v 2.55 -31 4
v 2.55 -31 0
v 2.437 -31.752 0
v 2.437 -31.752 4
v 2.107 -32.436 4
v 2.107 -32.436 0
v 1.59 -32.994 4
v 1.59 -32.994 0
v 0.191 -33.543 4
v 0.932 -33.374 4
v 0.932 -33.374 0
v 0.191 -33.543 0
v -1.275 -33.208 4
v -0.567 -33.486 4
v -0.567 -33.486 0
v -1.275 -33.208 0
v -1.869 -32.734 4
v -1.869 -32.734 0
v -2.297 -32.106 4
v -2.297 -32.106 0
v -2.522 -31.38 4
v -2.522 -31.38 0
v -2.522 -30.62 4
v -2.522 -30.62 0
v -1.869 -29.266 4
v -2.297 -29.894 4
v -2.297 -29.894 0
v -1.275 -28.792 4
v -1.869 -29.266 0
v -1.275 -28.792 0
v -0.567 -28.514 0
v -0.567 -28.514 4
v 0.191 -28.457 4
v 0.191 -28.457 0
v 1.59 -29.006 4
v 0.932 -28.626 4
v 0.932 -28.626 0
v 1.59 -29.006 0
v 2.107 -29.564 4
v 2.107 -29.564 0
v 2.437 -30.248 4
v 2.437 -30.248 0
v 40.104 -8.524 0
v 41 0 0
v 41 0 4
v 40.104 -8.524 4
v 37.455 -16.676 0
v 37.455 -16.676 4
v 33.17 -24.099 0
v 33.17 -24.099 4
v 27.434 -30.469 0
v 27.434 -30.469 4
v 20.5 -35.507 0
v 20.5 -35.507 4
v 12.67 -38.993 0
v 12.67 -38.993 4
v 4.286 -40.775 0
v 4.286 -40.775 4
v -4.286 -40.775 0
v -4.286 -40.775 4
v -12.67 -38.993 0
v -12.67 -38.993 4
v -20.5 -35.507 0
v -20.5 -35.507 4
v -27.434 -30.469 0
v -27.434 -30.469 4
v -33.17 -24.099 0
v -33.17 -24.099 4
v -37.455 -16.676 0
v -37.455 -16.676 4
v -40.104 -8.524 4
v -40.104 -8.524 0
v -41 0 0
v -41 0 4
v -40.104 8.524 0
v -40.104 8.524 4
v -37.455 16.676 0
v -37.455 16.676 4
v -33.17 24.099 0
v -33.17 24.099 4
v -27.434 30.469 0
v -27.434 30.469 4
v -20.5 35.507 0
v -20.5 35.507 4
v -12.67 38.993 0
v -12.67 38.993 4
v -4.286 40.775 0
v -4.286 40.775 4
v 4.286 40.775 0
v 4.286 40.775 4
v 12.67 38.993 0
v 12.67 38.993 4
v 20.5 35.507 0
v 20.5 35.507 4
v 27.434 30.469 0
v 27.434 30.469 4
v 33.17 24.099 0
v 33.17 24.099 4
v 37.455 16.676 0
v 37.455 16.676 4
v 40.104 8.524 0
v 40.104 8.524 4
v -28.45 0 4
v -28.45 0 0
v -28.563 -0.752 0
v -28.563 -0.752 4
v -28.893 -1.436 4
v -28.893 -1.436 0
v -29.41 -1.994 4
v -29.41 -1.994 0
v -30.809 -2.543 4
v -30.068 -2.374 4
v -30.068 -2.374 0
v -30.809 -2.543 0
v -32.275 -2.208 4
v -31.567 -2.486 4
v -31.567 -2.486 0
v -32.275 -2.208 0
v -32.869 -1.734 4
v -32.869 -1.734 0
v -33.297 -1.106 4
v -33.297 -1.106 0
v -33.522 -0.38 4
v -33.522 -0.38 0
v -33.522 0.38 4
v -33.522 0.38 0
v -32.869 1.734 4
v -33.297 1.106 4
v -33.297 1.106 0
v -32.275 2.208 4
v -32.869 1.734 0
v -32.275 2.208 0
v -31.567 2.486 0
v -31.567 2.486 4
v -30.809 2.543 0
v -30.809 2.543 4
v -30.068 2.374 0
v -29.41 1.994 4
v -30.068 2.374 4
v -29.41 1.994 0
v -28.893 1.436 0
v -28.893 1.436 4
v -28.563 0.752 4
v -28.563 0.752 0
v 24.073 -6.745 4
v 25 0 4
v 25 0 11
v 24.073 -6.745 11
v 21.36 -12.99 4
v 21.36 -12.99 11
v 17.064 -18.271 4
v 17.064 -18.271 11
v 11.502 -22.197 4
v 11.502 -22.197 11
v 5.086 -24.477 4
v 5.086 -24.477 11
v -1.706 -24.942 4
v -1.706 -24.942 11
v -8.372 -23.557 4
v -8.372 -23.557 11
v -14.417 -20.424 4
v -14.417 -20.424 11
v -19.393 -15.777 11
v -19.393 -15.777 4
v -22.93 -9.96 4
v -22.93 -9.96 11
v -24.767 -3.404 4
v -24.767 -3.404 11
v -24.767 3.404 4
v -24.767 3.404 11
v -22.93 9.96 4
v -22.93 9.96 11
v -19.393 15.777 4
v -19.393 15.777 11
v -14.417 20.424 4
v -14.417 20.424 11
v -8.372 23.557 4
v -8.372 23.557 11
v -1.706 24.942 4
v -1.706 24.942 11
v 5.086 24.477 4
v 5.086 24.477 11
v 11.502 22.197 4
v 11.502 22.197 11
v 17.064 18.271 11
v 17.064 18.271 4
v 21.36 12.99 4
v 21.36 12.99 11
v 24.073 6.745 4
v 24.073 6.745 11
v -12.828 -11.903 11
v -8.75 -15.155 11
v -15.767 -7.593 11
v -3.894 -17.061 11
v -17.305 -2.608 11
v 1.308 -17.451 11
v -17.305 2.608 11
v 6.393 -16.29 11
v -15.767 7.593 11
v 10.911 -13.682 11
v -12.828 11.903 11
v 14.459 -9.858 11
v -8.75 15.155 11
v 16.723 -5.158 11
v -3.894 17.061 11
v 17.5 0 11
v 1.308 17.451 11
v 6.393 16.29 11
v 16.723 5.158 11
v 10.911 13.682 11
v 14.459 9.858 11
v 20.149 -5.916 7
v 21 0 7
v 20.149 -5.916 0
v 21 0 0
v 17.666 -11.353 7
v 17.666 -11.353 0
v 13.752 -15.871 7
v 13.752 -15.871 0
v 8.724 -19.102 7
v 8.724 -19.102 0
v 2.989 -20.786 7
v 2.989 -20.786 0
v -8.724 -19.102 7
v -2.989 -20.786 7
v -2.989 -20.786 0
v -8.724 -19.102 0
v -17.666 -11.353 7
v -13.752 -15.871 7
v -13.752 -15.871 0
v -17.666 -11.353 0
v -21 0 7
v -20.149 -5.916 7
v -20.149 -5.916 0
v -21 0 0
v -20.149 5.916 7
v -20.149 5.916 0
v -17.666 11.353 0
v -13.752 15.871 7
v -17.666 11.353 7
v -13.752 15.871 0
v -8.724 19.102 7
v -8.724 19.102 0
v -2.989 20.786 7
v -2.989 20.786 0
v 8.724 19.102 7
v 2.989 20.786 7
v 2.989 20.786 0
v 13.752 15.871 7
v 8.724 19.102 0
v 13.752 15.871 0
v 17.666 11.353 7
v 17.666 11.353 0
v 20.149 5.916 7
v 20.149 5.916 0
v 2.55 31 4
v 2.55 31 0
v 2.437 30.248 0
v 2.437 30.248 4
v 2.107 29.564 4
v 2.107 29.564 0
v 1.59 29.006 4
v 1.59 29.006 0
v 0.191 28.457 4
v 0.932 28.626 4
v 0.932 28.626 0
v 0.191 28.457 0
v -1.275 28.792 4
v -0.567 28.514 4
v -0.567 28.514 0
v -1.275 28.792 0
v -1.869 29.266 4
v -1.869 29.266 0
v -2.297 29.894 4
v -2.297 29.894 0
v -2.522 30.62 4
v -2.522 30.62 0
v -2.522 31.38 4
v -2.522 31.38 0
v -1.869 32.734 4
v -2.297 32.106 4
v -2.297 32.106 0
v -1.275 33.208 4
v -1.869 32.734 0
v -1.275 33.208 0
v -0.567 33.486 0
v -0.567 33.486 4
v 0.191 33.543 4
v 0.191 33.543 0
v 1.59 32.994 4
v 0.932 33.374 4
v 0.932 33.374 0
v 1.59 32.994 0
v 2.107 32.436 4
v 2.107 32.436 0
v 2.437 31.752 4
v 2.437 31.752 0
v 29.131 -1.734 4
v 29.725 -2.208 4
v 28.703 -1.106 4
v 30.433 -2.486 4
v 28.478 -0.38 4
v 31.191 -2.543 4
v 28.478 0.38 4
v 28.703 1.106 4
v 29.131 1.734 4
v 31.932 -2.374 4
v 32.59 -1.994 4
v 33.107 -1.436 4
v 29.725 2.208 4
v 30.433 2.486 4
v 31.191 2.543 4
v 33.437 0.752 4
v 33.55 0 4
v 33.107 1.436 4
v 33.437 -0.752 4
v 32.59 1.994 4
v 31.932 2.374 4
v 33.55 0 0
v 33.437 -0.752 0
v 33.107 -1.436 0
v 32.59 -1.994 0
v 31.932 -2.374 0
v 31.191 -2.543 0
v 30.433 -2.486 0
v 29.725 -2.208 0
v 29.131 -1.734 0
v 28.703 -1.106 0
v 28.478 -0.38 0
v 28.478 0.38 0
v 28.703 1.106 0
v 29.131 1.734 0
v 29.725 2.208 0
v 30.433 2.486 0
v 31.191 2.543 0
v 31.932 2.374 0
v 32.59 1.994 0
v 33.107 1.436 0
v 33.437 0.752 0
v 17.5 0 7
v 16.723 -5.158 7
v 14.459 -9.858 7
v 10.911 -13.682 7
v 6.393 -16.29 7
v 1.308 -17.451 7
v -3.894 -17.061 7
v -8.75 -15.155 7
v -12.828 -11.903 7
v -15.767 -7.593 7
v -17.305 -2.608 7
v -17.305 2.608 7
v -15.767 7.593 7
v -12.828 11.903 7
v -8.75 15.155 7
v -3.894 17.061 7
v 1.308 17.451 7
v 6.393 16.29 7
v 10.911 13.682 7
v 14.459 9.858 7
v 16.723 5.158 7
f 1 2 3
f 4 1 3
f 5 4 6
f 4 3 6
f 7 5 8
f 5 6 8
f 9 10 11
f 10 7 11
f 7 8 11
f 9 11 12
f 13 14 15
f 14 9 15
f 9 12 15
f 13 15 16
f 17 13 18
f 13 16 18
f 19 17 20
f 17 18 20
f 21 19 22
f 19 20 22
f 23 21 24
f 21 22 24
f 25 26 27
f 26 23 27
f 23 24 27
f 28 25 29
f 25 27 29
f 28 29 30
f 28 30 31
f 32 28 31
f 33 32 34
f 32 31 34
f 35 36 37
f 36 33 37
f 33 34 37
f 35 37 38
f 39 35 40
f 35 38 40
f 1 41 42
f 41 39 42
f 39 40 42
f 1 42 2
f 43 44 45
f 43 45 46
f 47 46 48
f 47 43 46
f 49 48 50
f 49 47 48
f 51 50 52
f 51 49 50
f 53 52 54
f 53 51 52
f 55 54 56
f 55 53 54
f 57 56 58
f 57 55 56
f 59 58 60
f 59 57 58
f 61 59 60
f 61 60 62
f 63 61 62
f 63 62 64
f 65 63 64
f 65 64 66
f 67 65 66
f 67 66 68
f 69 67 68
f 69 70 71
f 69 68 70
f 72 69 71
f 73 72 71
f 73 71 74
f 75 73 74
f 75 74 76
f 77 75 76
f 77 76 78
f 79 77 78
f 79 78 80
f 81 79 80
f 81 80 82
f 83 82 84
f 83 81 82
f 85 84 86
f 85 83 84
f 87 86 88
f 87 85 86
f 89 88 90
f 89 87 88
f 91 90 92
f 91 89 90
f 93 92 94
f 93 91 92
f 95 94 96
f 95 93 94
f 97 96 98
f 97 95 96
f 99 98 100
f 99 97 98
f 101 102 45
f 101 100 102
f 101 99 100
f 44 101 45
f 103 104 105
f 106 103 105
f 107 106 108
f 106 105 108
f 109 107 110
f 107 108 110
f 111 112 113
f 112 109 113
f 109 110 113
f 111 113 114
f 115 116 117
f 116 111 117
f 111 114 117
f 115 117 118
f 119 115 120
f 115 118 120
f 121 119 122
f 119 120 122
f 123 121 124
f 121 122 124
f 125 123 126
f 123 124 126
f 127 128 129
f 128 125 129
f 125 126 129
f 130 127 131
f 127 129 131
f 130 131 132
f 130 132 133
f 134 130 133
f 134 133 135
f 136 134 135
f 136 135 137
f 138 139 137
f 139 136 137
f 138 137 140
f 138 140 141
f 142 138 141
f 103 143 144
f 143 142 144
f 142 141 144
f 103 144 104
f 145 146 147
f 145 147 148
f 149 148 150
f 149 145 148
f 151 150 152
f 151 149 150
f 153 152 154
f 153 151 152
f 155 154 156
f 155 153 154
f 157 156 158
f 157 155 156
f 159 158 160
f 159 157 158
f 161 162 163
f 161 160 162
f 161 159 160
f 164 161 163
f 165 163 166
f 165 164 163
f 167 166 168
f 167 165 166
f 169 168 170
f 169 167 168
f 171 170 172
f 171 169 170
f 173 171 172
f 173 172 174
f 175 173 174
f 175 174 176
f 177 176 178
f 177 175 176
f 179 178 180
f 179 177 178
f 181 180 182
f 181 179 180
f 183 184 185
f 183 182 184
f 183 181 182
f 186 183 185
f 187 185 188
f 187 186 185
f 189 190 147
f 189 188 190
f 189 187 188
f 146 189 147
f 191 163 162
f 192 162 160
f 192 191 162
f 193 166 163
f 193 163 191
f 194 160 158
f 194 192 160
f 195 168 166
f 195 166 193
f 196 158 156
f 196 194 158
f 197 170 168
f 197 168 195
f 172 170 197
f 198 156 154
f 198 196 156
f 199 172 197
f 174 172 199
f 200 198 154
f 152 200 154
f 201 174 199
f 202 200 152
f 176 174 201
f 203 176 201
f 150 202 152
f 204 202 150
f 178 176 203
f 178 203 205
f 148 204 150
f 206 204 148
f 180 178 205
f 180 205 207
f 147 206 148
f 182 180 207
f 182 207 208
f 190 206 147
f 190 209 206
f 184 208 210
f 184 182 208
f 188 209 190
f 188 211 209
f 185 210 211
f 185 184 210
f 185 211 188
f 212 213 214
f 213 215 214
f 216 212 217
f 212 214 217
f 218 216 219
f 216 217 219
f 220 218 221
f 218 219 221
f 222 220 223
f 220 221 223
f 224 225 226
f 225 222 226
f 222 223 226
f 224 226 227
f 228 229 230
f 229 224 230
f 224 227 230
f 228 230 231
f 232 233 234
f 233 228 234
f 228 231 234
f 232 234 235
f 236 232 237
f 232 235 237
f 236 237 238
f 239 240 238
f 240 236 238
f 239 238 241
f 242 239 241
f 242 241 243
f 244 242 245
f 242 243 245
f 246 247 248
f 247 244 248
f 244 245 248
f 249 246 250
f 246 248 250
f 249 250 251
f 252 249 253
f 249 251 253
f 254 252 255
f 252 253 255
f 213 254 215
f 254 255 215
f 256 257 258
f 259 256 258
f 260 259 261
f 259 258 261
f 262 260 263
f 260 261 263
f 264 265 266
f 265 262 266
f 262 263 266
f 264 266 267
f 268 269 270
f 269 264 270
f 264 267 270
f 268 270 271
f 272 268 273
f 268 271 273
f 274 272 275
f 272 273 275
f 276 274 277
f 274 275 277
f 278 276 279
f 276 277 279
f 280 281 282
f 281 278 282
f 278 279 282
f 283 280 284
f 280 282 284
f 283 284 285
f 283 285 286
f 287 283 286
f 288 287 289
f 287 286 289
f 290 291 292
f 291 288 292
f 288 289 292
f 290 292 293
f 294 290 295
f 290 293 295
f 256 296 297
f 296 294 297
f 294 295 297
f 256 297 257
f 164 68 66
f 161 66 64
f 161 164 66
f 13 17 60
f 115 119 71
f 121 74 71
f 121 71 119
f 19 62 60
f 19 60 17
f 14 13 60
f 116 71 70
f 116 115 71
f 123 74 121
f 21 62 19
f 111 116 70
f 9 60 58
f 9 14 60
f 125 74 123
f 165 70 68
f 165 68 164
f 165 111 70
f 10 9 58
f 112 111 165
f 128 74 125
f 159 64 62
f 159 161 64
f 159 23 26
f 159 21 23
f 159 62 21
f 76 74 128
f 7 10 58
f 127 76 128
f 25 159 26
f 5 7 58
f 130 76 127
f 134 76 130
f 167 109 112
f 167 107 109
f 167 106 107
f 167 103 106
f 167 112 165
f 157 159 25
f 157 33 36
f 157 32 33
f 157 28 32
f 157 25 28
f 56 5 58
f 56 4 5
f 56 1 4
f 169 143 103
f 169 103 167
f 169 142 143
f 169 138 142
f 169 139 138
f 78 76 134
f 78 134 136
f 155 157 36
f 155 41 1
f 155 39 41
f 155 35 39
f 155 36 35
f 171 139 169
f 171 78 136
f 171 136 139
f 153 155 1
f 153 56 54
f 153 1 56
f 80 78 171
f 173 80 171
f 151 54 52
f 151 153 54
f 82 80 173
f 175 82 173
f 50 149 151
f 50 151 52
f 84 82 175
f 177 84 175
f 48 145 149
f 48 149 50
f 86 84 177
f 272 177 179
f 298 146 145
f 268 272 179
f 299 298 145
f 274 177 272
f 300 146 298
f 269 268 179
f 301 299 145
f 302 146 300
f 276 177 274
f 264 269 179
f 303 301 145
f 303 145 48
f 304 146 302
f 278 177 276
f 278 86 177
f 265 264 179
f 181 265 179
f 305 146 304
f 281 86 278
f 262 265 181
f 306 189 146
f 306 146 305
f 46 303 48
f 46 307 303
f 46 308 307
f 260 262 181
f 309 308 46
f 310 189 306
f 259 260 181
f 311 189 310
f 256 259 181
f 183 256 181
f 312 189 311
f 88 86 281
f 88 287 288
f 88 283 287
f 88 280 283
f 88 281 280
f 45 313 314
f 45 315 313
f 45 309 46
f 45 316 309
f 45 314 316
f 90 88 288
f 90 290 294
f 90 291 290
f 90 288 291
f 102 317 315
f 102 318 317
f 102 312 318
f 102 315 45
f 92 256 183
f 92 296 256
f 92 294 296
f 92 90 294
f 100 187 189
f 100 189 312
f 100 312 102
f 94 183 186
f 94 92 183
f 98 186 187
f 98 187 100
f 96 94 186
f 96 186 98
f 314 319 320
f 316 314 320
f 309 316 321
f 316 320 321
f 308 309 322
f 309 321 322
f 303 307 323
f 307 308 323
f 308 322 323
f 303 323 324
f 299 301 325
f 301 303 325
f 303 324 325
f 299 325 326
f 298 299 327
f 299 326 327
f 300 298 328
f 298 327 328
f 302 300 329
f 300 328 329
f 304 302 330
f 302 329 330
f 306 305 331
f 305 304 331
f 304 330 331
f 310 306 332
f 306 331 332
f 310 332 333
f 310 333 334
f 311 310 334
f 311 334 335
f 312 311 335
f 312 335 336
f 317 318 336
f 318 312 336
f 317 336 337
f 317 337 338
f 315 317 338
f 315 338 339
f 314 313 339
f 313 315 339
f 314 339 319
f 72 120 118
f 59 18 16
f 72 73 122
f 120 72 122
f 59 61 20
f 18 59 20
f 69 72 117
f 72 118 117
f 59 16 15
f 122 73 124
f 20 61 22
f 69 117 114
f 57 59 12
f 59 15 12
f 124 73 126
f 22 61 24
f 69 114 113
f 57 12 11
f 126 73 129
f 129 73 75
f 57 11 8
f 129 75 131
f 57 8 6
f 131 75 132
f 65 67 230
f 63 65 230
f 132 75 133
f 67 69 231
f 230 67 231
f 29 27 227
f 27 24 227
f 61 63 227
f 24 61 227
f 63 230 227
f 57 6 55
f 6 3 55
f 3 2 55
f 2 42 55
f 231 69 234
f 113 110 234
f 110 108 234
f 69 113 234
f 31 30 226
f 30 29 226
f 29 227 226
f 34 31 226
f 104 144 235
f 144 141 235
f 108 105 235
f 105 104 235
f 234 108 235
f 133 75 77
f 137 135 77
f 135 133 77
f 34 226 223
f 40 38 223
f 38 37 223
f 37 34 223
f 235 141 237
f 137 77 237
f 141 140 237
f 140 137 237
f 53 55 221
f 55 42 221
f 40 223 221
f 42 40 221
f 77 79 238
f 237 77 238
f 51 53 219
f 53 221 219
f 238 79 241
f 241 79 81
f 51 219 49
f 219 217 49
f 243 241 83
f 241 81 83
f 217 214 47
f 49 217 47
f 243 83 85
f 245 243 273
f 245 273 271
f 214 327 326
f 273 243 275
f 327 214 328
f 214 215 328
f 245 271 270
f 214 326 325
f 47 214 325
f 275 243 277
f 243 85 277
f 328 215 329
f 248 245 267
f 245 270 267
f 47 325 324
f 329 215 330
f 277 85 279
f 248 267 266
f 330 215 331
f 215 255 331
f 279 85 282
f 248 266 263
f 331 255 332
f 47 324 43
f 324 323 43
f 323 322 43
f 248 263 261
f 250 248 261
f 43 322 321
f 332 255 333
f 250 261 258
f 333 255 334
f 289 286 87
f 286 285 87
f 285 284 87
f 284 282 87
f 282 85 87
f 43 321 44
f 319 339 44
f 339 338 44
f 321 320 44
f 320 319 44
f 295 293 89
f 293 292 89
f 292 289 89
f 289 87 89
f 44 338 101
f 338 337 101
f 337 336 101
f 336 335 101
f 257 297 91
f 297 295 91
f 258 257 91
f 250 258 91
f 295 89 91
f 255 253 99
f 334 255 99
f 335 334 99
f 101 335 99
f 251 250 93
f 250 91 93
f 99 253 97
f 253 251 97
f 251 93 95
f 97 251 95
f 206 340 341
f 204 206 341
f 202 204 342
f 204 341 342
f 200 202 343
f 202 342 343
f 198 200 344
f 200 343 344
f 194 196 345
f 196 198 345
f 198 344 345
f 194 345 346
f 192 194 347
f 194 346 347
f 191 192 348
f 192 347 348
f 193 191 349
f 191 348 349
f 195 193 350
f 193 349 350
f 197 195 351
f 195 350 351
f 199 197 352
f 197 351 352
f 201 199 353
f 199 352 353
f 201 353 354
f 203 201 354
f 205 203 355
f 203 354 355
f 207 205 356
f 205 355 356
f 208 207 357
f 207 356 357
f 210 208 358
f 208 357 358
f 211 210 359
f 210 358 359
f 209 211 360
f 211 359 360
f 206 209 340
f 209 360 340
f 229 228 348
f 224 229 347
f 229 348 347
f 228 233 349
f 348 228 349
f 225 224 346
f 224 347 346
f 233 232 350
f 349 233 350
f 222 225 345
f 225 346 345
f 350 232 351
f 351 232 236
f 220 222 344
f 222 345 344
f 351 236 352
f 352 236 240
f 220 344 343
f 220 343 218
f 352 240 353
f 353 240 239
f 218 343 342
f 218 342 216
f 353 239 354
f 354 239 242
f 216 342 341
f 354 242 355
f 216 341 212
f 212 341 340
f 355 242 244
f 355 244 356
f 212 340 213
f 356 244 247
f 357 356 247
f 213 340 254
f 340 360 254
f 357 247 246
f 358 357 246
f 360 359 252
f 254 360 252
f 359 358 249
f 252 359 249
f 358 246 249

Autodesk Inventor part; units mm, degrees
ref_plane "YZ Plane" through (0, 0, 0) normal (1, 0, 0) x (0, 1, 0)
ref_plane "XZ Plane" through (0, 0, 0) normal (0, 1, 0) x (-1, 0, 0)
ref_plane "XY Plane" through (0, 0, 0) normal (0, 0, 1) x (1, 0, 0)
sketch "Sketch1" plane through (0, 0, 0) normal (0, 0, 1) x (1, 0, 0)
  circle A0 centre (0, 0) radius 21
  circle A1 centre (0, 0) radius 41
  circle A2 centre (0, 0) radius 31 construction
  circle A3 centre (0, 31) radius 2.55
  circle A4 centre (-31, 0) radius 2.55
  circle A5 centre (0, -31) radius 2.55
  circle A6 centre (31, 0) radius 2.55
  dimension "d0" = 42
  dimension "d1" = 20
  dimension "d2" = 10
  dimension "d3" = 5.1
  dimension "d6" = 360
extrude "Extrusion1" add sketch "Sketch1" along normal blind 4
sketch "Sketch2" plane through (0, 0, 4) normal (0, 0, 1) x (1, 0, 0)
  circle A0 centre (0, 0) radius 25
  circle A1 centre (0, 0) radius 21 projected
  dimension "d10" = 4
extrude "Extrusion2" add sketch "Sketch2" along normal blind 3
sketch "Sketch3" plane through (0, 0, 7) normal (0, 0, 1) x (1, 0, 0)
  circle A0 centre (0, 0) radius 25 projected
  circle A1 centre (0, 0) radius 17.5
  dimension "d13" = 35
extrude "Extrusion3" add sketch "Sketch3" along normal blind 4
properties part number "BearingHolder"
